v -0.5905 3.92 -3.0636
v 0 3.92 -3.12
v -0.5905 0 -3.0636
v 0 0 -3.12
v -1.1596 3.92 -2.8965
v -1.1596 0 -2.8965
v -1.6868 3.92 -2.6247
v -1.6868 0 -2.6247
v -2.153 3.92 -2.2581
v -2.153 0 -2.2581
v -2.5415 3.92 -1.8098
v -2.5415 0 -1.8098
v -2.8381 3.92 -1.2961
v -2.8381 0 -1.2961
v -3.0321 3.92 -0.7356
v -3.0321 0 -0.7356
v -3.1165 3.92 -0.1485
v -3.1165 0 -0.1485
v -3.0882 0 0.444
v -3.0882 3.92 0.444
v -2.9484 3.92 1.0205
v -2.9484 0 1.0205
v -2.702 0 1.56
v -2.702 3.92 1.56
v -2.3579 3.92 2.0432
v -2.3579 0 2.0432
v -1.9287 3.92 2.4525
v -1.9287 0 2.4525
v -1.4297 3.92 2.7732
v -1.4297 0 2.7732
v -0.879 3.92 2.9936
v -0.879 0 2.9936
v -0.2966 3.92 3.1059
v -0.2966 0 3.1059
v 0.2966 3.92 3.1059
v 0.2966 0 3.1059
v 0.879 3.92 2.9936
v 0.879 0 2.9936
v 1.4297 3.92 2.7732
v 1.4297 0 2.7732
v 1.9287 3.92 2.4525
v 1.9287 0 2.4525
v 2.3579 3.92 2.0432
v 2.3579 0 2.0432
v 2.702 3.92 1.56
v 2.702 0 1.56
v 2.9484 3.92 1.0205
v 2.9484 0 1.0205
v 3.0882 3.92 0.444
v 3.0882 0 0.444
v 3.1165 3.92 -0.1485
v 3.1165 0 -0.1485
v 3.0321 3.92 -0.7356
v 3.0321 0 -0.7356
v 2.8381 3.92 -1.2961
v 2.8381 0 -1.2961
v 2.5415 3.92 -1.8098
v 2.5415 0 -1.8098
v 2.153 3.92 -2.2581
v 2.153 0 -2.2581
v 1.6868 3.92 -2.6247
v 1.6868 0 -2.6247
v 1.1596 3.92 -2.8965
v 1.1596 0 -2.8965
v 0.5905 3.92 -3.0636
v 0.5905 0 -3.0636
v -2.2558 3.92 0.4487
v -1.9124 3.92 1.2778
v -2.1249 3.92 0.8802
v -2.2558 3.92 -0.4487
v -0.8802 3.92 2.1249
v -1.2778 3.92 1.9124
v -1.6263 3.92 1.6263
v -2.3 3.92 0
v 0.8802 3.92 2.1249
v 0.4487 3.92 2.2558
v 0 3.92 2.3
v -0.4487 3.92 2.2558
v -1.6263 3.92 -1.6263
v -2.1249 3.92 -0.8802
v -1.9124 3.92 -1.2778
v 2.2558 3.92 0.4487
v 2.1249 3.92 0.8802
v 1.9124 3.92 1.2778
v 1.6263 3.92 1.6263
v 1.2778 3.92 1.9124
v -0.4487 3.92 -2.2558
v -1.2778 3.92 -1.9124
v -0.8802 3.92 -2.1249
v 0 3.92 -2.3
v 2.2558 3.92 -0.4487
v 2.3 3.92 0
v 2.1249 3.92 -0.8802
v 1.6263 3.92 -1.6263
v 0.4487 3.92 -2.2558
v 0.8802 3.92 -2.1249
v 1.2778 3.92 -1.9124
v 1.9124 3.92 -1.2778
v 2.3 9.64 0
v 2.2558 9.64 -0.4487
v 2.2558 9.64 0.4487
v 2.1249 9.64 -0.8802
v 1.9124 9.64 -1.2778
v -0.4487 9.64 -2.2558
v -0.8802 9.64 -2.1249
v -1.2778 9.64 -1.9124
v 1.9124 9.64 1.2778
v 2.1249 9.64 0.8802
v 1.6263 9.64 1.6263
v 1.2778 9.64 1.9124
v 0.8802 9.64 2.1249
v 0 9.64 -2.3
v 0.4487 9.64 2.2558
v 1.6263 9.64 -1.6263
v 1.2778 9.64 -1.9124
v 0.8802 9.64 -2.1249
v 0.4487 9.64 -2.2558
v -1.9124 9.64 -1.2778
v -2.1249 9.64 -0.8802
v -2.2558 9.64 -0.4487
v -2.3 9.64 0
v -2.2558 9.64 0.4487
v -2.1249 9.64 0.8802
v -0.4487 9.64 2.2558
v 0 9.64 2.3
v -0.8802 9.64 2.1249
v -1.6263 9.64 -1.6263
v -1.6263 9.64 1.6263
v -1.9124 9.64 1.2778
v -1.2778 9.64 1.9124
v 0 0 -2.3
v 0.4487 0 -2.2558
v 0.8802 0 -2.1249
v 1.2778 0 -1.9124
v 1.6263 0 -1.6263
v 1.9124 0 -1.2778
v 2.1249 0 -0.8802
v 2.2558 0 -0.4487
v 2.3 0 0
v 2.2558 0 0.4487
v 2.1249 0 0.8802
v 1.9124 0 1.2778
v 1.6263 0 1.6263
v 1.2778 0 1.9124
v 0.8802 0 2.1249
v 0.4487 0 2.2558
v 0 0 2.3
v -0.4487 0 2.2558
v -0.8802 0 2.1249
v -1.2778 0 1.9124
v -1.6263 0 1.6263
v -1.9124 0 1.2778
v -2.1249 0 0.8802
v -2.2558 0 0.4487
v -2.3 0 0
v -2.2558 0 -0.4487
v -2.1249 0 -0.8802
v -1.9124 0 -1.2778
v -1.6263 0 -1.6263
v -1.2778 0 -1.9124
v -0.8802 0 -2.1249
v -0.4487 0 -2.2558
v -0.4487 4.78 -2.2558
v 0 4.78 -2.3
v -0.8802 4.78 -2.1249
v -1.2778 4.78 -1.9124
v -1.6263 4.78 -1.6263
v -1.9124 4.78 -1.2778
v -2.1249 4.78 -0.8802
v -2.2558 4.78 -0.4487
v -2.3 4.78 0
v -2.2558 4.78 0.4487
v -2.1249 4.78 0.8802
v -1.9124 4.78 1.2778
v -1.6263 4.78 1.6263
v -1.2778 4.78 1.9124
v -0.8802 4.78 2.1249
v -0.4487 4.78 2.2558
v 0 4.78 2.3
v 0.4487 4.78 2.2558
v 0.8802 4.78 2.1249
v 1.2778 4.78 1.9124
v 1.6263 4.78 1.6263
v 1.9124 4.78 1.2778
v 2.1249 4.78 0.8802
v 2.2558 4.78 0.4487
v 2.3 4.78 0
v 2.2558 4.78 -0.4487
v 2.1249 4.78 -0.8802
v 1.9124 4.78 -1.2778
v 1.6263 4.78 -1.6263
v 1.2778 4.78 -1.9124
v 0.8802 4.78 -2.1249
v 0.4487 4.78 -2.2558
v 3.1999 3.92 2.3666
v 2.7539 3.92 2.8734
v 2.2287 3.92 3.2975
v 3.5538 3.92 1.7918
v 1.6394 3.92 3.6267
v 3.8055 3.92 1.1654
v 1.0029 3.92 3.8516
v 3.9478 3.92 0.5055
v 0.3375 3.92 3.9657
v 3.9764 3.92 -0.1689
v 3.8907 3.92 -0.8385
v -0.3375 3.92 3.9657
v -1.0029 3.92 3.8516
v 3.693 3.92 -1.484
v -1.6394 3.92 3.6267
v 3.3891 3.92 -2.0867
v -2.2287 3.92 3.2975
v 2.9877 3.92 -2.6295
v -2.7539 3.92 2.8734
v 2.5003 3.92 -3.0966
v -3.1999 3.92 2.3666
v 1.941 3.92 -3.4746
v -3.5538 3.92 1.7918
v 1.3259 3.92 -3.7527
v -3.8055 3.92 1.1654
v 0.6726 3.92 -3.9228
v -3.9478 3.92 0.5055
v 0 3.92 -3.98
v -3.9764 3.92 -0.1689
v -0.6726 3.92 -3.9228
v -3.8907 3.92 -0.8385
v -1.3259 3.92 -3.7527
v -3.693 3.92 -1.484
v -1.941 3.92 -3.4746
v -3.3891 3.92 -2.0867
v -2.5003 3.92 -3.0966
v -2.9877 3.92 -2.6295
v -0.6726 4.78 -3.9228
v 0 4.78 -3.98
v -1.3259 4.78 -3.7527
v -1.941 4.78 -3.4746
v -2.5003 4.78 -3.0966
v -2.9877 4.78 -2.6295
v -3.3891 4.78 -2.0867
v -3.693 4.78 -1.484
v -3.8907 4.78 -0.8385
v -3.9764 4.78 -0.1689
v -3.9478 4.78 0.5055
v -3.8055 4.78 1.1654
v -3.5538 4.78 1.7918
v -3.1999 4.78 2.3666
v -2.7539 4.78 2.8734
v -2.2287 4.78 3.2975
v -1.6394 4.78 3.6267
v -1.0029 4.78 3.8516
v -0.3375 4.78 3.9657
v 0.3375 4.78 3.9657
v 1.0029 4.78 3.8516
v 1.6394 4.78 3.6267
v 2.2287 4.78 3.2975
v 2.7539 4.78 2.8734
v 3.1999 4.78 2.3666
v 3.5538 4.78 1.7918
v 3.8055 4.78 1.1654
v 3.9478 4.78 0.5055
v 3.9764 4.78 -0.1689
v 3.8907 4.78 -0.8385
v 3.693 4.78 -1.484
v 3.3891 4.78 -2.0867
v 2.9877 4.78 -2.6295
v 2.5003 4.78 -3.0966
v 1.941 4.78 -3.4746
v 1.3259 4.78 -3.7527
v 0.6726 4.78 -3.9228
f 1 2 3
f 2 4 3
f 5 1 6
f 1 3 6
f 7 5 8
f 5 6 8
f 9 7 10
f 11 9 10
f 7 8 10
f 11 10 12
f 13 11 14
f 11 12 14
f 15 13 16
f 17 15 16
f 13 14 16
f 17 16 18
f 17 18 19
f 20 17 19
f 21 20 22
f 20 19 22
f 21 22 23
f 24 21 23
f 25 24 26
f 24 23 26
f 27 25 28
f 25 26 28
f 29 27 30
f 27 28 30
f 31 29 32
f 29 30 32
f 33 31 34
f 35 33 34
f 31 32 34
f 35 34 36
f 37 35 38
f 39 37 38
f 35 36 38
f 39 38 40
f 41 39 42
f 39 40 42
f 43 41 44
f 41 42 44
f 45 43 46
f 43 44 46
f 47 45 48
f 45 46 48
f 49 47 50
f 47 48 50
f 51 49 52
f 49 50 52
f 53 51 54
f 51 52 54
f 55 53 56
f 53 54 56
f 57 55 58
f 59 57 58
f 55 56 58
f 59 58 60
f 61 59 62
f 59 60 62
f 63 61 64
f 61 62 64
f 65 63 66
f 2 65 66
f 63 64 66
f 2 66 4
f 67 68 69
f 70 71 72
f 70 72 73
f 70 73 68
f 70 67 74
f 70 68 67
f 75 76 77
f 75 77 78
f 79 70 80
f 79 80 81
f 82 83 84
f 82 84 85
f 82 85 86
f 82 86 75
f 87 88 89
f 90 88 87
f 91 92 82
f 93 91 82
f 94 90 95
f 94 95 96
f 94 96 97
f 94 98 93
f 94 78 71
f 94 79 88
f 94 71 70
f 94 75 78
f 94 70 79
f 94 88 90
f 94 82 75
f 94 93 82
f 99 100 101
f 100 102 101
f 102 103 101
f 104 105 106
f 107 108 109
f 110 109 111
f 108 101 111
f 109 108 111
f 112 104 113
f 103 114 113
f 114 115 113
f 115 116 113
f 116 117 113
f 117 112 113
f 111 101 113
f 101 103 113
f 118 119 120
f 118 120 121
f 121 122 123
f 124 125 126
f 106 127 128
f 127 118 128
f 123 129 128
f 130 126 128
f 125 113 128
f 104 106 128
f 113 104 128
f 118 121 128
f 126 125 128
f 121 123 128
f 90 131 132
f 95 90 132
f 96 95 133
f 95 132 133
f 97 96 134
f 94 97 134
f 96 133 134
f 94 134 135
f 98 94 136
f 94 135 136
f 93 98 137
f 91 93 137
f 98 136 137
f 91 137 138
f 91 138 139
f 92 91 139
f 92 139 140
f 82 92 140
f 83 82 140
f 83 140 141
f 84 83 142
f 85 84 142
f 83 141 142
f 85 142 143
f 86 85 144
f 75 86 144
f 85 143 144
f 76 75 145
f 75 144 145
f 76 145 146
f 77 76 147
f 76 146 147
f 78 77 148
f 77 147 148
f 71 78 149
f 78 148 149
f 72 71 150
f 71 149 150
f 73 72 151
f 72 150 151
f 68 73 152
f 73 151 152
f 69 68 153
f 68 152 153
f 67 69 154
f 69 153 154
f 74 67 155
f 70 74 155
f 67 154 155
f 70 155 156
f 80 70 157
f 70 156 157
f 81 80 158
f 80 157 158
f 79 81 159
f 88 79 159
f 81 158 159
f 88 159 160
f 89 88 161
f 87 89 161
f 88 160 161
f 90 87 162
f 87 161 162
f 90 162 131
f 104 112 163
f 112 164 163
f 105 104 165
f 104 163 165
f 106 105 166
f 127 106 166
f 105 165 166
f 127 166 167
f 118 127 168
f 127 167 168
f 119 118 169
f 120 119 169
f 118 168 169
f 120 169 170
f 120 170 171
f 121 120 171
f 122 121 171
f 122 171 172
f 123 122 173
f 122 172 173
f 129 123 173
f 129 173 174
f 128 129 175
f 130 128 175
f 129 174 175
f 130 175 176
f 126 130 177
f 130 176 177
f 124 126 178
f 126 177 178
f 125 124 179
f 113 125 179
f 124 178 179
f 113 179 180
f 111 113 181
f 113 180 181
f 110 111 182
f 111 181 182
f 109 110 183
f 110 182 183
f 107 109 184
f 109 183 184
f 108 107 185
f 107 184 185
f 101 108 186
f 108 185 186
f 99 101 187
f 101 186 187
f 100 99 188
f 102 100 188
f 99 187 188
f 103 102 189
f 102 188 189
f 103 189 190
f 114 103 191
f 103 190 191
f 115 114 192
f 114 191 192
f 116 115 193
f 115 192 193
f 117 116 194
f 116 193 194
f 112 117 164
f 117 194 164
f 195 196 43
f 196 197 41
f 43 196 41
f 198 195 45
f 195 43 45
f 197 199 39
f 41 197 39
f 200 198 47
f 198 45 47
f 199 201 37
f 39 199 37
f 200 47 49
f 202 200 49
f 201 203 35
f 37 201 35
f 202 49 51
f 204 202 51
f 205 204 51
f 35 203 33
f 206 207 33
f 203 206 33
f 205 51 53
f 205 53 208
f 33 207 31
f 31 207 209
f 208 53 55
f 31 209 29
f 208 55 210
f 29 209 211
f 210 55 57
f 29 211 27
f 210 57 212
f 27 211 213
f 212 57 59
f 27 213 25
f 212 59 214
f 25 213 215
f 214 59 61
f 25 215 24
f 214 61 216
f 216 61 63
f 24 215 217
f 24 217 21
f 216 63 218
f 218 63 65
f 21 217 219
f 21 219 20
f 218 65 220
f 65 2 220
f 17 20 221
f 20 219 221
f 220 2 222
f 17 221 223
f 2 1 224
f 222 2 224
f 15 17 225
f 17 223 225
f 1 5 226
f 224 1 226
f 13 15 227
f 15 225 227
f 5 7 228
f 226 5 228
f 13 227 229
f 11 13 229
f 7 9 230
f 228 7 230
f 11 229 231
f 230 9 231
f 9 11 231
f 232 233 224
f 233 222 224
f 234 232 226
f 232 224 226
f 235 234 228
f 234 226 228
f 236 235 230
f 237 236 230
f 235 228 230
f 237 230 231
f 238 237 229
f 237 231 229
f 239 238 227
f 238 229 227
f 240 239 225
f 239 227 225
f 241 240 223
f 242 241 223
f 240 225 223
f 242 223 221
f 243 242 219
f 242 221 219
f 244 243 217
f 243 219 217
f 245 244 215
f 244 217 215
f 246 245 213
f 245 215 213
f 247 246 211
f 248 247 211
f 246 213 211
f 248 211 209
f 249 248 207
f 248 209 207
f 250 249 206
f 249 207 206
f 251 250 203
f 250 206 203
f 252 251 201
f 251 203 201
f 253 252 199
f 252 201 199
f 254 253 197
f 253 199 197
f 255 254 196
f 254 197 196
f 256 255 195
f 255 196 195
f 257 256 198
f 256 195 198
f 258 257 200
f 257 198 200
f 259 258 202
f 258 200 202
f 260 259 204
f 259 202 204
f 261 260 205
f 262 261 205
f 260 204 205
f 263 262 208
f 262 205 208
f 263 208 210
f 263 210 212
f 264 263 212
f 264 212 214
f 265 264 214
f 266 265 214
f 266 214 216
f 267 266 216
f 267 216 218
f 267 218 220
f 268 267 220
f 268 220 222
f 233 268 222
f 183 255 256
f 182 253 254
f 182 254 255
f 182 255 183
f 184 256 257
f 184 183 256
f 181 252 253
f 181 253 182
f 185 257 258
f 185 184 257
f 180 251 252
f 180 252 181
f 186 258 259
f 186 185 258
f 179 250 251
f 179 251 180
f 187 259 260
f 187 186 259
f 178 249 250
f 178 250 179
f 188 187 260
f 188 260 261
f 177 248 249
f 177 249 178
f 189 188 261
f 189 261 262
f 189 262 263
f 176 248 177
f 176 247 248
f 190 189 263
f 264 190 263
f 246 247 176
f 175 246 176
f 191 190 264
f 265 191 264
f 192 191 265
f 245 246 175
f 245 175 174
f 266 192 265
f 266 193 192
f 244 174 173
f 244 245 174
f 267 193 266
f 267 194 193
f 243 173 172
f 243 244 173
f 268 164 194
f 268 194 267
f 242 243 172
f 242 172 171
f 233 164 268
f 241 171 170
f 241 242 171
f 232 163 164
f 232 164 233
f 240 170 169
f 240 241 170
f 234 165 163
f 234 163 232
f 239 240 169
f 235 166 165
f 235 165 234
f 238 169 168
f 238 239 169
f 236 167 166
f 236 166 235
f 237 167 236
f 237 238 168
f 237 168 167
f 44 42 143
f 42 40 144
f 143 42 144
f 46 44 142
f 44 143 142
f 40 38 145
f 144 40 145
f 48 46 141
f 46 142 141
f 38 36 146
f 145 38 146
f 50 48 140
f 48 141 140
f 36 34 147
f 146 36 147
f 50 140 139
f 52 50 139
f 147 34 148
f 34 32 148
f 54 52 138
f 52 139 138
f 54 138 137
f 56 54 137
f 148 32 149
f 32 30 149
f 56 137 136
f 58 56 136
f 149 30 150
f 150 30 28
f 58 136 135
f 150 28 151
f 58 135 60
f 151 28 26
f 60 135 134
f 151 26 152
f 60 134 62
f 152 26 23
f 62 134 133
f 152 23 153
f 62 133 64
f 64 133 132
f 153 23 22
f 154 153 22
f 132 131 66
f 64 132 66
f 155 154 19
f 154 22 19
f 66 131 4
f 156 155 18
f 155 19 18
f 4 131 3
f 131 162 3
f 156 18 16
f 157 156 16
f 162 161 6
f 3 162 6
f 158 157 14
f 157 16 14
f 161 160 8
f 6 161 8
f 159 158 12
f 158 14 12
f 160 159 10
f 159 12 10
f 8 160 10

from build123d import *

# Parameters (mm, degrees)
SKETCH_2_R          = 2.3
CUT_EXTRUDE_1_DEPTH = 3.92
CUT_EXTRUDE_START   = -0.62
SKETCH_3_R          = 3.98
SKETCH_3_R_2        = 2.3
CUT_EXTRUDE_2_DEPTH = 0.62


with BuildPart() as part:
    # 草图1 → 旋转1 (revolve)
    with BuildSketch(Plane.XY, mode=Mode.PRIVATE) as revolve_1_sk:
        Polygon((0, 0), (0, 9.64), (2.3, 9.64), (2.3, 5.4), (3.98, 5.4), (3.98, 3.92), (3.12, 3.92), (3.12, 0), align=None)
    revolve(revolve_1_sk.sketch.rotate(Axis((0, 0, 0), (0, 1, 0)), 90), axis=Axis((0, 0, 0), (0, 1, 0)))

    # 草图2 → 切除-拉伸1 (cut)
    with BuildSketch(Plane.XZ):
        with Locations(Location((0, 0, 0), (0, 0, 270))):
            Circle(SKETCH_2_R)
    extrude(amount=-CUT_EXTRUDE_1_DEPTH, mode=Mode.SUBTRACT)

    # 草图3 → 切除-拉伸2 (cut)
    with BuildSketch(Plane(origin=(0, 5.4, 0), x_dir=(1, 0, 0), z_dir=(0, 1, 0)).offset(CUT_EXTRUDE_START)):
        with Locations(Location((0, 0, 0), (0, 0, 90))):
            Circle(SKETCH_3_R)
        with Locations(Location((0, 0, 0), (0, 0, 90))):
            Circle(SKETCH_3_R_2, mode=Mode.SUBTRACT)
    extrude(amount=CUT_EXTRUDE_2_DEPTH, mode=Mode.SUBTRACT)


solid = part.part
